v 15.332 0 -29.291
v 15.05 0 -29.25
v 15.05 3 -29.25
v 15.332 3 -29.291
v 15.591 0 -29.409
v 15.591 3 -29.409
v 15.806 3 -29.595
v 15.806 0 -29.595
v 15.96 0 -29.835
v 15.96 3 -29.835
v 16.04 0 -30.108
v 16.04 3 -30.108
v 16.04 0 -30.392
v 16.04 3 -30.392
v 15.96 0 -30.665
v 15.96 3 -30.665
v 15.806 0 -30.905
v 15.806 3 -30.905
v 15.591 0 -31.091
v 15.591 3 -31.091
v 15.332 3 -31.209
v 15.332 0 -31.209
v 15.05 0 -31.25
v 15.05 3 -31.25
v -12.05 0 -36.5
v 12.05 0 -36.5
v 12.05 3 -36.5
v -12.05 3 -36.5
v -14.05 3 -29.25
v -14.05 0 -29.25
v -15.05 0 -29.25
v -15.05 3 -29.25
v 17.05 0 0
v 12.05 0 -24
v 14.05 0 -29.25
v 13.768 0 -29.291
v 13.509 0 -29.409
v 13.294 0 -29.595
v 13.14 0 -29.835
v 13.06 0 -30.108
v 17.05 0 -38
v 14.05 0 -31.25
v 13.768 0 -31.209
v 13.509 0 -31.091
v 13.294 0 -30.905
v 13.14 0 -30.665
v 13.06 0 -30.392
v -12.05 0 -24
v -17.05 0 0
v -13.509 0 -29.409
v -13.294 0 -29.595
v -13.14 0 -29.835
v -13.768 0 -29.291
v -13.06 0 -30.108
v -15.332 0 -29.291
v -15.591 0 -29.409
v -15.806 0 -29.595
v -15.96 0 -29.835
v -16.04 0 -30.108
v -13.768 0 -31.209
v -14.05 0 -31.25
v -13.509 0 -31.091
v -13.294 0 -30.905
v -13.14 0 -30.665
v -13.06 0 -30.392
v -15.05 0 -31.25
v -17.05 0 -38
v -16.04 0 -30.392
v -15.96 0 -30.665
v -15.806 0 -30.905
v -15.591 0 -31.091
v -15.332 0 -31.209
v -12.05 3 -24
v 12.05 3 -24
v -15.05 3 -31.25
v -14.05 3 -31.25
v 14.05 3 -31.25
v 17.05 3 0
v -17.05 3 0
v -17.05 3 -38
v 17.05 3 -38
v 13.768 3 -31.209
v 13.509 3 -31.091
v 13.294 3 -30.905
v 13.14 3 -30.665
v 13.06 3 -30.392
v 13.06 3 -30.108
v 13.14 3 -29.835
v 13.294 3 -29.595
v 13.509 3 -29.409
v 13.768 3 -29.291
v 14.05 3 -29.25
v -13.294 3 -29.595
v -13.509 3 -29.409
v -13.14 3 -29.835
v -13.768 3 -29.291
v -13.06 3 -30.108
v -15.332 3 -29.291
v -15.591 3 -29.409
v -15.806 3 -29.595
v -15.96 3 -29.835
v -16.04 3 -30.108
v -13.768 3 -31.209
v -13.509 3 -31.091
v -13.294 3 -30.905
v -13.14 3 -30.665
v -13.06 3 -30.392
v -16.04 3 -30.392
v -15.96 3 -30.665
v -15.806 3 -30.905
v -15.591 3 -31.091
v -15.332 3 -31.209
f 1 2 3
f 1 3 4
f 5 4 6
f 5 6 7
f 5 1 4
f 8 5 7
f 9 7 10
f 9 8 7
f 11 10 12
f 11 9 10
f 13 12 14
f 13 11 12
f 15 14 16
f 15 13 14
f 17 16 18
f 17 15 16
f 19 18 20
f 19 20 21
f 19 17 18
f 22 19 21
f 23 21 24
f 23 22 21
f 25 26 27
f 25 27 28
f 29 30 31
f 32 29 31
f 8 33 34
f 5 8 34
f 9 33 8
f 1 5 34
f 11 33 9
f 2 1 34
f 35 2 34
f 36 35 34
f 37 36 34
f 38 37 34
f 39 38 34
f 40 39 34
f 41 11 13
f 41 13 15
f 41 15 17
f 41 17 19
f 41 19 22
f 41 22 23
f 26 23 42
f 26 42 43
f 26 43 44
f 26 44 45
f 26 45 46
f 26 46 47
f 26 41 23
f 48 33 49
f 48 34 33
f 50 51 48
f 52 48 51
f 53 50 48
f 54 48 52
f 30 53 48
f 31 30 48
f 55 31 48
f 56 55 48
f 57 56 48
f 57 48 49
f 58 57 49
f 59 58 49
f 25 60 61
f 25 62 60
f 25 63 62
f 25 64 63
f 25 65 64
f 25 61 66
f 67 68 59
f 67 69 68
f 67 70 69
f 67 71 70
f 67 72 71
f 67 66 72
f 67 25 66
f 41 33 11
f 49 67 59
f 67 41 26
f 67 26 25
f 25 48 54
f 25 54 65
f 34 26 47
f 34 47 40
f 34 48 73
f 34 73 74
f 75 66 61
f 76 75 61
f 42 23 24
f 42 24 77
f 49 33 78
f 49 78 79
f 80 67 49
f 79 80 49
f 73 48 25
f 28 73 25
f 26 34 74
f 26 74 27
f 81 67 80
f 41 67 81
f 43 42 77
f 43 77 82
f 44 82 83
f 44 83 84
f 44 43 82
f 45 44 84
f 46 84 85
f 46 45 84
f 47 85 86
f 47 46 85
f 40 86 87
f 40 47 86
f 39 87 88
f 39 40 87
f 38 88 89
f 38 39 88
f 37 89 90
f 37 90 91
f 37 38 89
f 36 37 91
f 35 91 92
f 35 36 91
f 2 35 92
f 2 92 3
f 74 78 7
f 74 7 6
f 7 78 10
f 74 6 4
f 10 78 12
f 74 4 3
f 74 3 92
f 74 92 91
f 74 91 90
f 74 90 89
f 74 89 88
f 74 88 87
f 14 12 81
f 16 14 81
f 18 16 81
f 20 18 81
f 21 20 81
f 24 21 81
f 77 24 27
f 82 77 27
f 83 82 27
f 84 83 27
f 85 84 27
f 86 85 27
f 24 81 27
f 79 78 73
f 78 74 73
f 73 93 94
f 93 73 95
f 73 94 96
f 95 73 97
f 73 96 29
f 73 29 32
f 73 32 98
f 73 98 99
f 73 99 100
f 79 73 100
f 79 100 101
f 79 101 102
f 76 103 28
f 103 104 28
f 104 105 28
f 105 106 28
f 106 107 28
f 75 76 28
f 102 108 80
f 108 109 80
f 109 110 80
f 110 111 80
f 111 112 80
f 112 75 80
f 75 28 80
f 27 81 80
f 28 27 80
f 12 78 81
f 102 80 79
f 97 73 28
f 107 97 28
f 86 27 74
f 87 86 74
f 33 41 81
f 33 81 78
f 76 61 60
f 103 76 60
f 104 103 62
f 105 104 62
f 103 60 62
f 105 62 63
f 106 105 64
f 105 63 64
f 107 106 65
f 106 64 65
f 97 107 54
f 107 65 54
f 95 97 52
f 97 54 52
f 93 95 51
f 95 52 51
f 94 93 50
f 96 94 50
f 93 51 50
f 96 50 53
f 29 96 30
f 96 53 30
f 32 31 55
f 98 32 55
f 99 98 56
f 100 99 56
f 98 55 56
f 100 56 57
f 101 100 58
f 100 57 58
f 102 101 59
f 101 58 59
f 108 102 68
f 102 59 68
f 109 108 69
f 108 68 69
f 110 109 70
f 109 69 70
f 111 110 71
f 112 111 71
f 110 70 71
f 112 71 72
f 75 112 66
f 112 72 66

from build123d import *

# Parameters (mm, degrees)
BOSS_EXTRU_1_DEPTH = 3


with BuildPart() as part:
    # Esquisse1 → Boss.-Extru.1 (new body)
    with BuildSketch(Plane(origin=(0, 0, 0), x_dir=(1, 0, 0), z_dir=(0, 1, 0))):
        Polygon((-12.05, 36.5), (0, 36.5), (0, 38), (-17.05, 38), (-17.05, 0), (0, 0), (0, 24), (-12.05, 24), align=None)
        with BuildLine():
            ThreePointArc((-15.05, 29.25), (-16.05, 30.25), (-15.05, 31.25))
            Line((-15.05, 31.25), (-14.05, 31.25))
            ThreePointArc((-14.05, 31.25), (-13.05, 30.25), (-14.05, 29.25))
            Line((-14.05, 29.25), (-15.05, 29.25))
        make_face(mode=Mode.SUBTRACT)
    boss_extru_1 = extrude(amount=BOSS_EXTRU_1_DEPTH)

    # Symétrie1: Boss.-Extru.1 across plane
    add(boss_extru_1.mirror(Plane(origin=(0, 3, 0), x_dir=(0, 0, 1), z_dir=(-1, 0, 0))))


solid = part.part
